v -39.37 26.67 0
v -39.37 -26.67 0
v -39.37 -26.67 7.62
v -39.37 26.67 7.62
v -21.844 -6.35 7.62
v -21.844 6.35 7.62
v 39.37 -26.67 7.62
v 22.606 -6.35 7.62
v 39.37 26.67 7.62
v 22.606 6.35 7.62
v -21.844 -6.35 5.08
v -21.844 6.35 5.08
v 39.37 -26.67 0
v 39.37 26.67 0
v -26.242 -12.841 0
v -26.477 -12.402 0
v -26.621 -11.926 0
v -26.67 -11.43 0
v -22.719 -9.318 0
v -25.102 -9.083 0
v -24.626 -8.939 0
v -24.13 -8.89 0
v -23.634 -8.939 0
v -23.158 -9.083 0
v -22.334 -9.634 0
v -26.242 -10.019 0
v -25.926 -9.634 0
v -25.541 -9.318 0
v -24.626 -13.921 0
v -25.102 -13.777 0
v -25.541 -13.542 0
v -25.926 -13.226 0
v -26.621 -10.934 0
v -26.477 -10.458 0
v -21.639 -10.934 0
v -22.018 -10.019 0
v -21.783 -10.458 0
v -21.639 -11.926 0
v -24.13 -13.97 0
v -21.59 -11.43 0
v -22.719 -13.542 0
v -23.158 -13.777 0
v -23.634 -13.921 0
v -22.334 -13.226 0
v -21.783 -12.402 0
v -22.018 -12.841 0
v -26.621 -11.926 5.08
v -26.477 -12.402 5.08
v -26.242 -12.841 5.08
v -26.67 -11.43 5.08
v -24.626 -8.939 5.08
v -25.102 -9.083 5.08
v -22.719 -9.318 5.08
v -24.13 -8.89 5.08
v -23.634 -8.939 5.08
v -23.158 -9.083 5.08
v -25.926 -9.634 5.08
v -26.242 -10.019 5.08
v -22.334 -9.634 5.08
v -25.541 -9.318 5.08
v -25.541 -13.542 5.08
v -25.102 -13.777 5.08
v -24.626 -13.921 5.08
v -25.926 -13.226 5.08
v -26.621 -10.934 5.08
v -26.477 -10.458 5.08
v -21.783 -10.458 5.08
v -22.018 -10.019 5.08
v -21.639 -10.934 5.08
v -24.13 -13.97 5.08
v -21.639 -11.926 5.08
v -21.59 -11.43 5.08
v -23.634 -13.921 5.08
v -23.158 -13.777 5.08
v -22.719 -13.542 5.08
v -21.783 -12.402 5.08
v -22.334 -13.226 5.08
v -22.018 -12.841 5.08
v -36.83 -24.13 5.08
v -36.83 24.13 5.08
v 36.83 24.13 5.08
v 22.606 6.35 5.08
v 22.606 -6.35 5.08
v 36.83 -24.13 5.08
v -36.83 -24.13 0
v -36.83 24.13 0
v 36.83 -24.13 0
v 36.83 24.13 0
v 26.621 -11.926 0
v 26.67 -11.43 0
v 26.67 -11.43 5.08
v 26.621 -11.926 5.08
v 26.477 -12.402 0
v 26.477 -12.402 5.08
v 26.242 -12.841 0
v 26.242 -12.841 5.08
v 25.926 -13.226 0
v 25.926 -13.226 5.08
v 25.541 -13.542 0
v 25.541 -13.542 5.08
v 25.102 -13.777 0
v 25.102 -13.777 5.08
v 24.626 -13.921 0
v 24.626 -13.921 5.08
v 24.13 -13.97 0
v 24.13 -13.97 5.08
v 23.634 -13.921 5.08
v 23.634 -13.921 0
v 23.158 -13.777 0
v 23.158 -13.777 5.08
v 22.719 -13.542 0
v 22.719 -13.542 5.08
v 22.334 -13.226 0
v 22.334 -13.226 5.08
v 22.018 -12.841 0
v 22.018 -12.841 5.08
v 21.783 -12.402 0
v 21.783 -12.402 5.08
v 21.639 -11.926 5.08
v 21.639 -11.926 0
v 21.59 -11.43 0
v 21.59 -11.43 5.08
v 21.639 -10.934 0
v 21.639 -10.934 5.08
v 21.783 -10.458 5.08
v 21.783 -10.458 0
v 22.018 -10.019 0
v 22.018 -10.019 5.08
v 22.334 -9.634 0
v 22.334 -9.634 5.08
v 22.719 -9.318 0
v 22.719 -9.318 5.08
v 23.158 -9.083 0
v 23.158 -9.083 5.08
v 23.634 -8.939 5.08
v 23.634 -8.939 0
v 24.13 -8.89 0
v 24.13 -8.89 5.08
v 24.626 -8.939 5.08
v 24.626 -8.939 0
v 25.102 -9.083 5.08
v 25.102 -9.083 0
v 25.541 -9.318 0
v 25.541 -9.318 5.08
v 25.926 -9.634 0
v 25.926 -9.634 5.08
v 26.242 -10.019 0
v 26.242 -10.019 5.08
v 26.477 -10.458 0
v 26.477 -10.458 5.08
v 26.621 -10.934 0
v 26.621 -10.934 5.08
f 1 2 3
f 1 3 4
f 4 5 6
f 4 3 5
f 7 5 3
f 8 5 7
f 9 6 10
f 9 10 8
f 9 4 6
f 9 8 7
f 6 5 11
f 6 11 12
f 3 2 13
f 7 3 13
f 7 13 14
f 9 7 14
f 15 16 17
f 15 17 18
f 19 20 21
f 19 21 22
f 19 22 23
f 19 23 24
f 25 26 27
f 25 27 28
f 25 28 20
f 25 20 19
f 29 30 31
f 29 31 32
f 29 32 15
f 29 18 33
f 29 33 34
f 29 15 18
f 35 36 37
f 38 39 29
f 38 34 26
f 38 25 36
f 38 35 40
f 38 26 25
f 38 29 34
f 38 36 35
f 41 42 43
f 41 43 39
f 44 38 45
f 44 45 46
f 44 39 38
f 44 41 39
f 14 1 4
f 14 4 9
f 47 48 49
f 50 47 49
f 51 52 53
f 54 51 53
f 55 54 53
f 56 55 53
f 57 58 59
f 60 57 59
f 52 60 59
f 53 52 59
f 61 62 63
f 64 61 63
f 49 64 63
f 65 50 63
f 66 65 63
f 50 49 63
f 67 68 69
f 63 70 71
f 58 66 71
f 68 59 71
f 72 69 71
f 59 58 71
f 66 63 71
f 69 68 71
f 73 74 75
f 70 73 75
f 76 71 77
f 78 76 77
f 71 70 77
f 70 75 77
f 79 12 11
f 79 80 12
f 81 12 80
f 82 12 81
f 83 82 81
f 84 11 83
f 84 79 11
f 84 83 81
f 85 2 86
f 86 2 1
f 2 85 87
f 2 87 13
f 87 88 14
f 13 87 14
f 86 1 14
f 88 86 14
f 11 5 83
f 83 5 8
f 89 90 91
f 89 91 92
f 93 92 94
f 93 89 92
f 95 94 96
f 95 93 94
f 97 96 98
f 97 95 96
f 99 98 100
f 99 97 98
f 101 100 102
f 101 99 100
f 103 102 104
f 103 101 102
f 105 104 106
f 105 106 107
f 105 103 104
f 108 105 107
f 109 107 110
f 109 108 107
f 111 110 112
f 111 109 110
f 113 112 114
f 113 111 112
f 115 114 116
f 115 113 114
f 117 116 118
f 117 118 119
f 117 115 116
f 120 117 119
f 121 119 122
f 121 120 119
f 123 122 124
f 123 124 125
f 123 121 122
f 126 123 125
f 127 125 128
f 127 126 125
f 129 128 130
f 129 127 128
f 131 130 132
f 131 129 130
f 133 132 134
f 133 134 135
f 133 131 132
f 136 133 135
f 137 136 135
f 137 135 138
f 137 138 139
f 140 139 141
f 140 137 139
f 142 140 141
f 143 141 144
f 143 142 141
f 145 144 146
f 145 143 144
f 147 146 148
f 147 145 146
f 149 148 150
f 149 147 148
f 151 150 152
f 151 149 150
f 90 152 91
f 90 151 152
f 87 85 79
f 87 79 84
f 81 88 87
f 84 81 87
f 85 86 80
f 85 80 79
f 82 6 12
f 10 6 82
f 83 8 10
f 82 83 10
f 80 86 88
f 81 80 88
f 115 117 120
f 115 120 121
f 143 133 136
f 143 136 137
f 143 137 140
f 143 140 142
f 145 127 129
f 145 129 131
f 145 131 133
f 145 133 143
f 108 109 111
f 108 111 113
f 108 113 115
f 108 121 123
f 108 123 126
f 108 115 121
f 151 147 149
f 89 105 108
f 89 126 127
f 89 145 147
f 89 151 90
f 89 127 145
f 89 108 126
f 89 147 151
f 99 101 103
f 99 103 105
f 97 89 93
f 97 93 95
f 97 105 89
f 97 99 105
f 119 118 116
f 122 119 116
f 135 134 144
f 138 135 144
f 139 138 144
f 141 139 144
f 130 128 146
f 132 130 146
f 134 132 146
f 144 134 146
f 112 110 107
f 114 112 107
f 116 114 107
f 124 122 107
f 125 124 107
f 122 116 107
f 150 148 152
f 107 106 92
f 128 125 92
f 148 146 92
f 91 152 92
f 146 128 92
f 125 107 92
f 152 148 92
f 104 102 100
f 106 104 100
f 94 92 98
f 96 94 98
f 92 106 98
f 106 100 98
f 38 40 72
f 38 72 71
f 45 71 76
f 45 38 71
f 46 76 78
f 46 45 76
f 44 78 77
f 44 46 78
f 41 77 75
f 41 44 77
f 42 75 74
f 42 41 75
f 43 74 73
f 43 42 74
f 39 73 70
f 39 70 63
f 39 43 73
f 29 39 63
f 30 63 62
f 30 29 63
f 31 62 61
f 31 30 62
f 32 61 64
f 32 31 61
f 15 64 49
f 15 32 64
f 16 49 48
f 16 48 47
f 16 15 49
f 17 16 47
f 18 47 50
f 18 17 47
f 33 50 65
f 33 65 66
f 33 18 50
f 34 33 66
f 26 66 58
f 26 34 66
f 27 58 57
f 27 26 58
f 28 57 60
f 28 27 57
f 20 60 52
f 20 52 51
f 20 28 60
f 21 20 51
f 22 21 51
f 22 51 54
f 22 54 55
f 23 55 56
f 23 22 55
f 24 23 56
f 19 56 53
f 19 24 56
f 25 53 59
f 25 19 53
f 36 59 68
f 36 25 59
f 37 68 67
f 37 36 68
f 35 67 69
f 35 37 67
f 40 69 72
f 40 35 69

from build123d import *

# Parameters (mm, degrees)
F0_W     = 78.74
F0_H     = 53.34
F1_DEPTH = 7.62
F3_W     = 73.66
F3_H     = 48.26
F4_DEPTH = 5.08
F5_W     = 44.45
F5_H     = 12.7
F6_DEPTH = 25.4
F7_R     = 2.54
F8_DEPTH = 5.08


with BuildPart() as f1:
    # F0 (on Top) → F1 (new body)
    with BuildSketch(Plane.XY):
        Rectangle(F0_W, F0_H)
    extrude(amount=F1_DEPTH)

    # F3 (on face) → F4 (cut)
    with BuildSketch(Plane(origin=(0, 0, 0), x_dir=(1, 0, 0), z_dir=(0, 0, -1))):
        Rectangle(F3_W, F3_H)
    extrude(amount=-F4_DEPTH, mode=Mode.SUBTRACT)

    # F5 (on face) → F6 (cut)
    with BuildSketch(Plane.XY.offset(7.62)):
        with Locations((0.381, 0)):
            Rectangle(F5_W, F5_H)
    extrude(amount=-F6_DEPTH, mode=Mode.SUBTRACT)


with BuildPart() as f8:
    # F7 (on face) → F8 (new body)
    with BuildSketch(Plane(origin=(0, 0, 0), x_dir=(1, 0, 0), z_dir=(0, 0, -1))):
        with Locations((24.13, 11.43)):
            Circle(F7_R)
        with Locations((-24.13, 11.43)):
            Circle(F7_R)
    extrude(amount=-F8_DEPTH)


solid = Compound([f1.part, f8.part])
